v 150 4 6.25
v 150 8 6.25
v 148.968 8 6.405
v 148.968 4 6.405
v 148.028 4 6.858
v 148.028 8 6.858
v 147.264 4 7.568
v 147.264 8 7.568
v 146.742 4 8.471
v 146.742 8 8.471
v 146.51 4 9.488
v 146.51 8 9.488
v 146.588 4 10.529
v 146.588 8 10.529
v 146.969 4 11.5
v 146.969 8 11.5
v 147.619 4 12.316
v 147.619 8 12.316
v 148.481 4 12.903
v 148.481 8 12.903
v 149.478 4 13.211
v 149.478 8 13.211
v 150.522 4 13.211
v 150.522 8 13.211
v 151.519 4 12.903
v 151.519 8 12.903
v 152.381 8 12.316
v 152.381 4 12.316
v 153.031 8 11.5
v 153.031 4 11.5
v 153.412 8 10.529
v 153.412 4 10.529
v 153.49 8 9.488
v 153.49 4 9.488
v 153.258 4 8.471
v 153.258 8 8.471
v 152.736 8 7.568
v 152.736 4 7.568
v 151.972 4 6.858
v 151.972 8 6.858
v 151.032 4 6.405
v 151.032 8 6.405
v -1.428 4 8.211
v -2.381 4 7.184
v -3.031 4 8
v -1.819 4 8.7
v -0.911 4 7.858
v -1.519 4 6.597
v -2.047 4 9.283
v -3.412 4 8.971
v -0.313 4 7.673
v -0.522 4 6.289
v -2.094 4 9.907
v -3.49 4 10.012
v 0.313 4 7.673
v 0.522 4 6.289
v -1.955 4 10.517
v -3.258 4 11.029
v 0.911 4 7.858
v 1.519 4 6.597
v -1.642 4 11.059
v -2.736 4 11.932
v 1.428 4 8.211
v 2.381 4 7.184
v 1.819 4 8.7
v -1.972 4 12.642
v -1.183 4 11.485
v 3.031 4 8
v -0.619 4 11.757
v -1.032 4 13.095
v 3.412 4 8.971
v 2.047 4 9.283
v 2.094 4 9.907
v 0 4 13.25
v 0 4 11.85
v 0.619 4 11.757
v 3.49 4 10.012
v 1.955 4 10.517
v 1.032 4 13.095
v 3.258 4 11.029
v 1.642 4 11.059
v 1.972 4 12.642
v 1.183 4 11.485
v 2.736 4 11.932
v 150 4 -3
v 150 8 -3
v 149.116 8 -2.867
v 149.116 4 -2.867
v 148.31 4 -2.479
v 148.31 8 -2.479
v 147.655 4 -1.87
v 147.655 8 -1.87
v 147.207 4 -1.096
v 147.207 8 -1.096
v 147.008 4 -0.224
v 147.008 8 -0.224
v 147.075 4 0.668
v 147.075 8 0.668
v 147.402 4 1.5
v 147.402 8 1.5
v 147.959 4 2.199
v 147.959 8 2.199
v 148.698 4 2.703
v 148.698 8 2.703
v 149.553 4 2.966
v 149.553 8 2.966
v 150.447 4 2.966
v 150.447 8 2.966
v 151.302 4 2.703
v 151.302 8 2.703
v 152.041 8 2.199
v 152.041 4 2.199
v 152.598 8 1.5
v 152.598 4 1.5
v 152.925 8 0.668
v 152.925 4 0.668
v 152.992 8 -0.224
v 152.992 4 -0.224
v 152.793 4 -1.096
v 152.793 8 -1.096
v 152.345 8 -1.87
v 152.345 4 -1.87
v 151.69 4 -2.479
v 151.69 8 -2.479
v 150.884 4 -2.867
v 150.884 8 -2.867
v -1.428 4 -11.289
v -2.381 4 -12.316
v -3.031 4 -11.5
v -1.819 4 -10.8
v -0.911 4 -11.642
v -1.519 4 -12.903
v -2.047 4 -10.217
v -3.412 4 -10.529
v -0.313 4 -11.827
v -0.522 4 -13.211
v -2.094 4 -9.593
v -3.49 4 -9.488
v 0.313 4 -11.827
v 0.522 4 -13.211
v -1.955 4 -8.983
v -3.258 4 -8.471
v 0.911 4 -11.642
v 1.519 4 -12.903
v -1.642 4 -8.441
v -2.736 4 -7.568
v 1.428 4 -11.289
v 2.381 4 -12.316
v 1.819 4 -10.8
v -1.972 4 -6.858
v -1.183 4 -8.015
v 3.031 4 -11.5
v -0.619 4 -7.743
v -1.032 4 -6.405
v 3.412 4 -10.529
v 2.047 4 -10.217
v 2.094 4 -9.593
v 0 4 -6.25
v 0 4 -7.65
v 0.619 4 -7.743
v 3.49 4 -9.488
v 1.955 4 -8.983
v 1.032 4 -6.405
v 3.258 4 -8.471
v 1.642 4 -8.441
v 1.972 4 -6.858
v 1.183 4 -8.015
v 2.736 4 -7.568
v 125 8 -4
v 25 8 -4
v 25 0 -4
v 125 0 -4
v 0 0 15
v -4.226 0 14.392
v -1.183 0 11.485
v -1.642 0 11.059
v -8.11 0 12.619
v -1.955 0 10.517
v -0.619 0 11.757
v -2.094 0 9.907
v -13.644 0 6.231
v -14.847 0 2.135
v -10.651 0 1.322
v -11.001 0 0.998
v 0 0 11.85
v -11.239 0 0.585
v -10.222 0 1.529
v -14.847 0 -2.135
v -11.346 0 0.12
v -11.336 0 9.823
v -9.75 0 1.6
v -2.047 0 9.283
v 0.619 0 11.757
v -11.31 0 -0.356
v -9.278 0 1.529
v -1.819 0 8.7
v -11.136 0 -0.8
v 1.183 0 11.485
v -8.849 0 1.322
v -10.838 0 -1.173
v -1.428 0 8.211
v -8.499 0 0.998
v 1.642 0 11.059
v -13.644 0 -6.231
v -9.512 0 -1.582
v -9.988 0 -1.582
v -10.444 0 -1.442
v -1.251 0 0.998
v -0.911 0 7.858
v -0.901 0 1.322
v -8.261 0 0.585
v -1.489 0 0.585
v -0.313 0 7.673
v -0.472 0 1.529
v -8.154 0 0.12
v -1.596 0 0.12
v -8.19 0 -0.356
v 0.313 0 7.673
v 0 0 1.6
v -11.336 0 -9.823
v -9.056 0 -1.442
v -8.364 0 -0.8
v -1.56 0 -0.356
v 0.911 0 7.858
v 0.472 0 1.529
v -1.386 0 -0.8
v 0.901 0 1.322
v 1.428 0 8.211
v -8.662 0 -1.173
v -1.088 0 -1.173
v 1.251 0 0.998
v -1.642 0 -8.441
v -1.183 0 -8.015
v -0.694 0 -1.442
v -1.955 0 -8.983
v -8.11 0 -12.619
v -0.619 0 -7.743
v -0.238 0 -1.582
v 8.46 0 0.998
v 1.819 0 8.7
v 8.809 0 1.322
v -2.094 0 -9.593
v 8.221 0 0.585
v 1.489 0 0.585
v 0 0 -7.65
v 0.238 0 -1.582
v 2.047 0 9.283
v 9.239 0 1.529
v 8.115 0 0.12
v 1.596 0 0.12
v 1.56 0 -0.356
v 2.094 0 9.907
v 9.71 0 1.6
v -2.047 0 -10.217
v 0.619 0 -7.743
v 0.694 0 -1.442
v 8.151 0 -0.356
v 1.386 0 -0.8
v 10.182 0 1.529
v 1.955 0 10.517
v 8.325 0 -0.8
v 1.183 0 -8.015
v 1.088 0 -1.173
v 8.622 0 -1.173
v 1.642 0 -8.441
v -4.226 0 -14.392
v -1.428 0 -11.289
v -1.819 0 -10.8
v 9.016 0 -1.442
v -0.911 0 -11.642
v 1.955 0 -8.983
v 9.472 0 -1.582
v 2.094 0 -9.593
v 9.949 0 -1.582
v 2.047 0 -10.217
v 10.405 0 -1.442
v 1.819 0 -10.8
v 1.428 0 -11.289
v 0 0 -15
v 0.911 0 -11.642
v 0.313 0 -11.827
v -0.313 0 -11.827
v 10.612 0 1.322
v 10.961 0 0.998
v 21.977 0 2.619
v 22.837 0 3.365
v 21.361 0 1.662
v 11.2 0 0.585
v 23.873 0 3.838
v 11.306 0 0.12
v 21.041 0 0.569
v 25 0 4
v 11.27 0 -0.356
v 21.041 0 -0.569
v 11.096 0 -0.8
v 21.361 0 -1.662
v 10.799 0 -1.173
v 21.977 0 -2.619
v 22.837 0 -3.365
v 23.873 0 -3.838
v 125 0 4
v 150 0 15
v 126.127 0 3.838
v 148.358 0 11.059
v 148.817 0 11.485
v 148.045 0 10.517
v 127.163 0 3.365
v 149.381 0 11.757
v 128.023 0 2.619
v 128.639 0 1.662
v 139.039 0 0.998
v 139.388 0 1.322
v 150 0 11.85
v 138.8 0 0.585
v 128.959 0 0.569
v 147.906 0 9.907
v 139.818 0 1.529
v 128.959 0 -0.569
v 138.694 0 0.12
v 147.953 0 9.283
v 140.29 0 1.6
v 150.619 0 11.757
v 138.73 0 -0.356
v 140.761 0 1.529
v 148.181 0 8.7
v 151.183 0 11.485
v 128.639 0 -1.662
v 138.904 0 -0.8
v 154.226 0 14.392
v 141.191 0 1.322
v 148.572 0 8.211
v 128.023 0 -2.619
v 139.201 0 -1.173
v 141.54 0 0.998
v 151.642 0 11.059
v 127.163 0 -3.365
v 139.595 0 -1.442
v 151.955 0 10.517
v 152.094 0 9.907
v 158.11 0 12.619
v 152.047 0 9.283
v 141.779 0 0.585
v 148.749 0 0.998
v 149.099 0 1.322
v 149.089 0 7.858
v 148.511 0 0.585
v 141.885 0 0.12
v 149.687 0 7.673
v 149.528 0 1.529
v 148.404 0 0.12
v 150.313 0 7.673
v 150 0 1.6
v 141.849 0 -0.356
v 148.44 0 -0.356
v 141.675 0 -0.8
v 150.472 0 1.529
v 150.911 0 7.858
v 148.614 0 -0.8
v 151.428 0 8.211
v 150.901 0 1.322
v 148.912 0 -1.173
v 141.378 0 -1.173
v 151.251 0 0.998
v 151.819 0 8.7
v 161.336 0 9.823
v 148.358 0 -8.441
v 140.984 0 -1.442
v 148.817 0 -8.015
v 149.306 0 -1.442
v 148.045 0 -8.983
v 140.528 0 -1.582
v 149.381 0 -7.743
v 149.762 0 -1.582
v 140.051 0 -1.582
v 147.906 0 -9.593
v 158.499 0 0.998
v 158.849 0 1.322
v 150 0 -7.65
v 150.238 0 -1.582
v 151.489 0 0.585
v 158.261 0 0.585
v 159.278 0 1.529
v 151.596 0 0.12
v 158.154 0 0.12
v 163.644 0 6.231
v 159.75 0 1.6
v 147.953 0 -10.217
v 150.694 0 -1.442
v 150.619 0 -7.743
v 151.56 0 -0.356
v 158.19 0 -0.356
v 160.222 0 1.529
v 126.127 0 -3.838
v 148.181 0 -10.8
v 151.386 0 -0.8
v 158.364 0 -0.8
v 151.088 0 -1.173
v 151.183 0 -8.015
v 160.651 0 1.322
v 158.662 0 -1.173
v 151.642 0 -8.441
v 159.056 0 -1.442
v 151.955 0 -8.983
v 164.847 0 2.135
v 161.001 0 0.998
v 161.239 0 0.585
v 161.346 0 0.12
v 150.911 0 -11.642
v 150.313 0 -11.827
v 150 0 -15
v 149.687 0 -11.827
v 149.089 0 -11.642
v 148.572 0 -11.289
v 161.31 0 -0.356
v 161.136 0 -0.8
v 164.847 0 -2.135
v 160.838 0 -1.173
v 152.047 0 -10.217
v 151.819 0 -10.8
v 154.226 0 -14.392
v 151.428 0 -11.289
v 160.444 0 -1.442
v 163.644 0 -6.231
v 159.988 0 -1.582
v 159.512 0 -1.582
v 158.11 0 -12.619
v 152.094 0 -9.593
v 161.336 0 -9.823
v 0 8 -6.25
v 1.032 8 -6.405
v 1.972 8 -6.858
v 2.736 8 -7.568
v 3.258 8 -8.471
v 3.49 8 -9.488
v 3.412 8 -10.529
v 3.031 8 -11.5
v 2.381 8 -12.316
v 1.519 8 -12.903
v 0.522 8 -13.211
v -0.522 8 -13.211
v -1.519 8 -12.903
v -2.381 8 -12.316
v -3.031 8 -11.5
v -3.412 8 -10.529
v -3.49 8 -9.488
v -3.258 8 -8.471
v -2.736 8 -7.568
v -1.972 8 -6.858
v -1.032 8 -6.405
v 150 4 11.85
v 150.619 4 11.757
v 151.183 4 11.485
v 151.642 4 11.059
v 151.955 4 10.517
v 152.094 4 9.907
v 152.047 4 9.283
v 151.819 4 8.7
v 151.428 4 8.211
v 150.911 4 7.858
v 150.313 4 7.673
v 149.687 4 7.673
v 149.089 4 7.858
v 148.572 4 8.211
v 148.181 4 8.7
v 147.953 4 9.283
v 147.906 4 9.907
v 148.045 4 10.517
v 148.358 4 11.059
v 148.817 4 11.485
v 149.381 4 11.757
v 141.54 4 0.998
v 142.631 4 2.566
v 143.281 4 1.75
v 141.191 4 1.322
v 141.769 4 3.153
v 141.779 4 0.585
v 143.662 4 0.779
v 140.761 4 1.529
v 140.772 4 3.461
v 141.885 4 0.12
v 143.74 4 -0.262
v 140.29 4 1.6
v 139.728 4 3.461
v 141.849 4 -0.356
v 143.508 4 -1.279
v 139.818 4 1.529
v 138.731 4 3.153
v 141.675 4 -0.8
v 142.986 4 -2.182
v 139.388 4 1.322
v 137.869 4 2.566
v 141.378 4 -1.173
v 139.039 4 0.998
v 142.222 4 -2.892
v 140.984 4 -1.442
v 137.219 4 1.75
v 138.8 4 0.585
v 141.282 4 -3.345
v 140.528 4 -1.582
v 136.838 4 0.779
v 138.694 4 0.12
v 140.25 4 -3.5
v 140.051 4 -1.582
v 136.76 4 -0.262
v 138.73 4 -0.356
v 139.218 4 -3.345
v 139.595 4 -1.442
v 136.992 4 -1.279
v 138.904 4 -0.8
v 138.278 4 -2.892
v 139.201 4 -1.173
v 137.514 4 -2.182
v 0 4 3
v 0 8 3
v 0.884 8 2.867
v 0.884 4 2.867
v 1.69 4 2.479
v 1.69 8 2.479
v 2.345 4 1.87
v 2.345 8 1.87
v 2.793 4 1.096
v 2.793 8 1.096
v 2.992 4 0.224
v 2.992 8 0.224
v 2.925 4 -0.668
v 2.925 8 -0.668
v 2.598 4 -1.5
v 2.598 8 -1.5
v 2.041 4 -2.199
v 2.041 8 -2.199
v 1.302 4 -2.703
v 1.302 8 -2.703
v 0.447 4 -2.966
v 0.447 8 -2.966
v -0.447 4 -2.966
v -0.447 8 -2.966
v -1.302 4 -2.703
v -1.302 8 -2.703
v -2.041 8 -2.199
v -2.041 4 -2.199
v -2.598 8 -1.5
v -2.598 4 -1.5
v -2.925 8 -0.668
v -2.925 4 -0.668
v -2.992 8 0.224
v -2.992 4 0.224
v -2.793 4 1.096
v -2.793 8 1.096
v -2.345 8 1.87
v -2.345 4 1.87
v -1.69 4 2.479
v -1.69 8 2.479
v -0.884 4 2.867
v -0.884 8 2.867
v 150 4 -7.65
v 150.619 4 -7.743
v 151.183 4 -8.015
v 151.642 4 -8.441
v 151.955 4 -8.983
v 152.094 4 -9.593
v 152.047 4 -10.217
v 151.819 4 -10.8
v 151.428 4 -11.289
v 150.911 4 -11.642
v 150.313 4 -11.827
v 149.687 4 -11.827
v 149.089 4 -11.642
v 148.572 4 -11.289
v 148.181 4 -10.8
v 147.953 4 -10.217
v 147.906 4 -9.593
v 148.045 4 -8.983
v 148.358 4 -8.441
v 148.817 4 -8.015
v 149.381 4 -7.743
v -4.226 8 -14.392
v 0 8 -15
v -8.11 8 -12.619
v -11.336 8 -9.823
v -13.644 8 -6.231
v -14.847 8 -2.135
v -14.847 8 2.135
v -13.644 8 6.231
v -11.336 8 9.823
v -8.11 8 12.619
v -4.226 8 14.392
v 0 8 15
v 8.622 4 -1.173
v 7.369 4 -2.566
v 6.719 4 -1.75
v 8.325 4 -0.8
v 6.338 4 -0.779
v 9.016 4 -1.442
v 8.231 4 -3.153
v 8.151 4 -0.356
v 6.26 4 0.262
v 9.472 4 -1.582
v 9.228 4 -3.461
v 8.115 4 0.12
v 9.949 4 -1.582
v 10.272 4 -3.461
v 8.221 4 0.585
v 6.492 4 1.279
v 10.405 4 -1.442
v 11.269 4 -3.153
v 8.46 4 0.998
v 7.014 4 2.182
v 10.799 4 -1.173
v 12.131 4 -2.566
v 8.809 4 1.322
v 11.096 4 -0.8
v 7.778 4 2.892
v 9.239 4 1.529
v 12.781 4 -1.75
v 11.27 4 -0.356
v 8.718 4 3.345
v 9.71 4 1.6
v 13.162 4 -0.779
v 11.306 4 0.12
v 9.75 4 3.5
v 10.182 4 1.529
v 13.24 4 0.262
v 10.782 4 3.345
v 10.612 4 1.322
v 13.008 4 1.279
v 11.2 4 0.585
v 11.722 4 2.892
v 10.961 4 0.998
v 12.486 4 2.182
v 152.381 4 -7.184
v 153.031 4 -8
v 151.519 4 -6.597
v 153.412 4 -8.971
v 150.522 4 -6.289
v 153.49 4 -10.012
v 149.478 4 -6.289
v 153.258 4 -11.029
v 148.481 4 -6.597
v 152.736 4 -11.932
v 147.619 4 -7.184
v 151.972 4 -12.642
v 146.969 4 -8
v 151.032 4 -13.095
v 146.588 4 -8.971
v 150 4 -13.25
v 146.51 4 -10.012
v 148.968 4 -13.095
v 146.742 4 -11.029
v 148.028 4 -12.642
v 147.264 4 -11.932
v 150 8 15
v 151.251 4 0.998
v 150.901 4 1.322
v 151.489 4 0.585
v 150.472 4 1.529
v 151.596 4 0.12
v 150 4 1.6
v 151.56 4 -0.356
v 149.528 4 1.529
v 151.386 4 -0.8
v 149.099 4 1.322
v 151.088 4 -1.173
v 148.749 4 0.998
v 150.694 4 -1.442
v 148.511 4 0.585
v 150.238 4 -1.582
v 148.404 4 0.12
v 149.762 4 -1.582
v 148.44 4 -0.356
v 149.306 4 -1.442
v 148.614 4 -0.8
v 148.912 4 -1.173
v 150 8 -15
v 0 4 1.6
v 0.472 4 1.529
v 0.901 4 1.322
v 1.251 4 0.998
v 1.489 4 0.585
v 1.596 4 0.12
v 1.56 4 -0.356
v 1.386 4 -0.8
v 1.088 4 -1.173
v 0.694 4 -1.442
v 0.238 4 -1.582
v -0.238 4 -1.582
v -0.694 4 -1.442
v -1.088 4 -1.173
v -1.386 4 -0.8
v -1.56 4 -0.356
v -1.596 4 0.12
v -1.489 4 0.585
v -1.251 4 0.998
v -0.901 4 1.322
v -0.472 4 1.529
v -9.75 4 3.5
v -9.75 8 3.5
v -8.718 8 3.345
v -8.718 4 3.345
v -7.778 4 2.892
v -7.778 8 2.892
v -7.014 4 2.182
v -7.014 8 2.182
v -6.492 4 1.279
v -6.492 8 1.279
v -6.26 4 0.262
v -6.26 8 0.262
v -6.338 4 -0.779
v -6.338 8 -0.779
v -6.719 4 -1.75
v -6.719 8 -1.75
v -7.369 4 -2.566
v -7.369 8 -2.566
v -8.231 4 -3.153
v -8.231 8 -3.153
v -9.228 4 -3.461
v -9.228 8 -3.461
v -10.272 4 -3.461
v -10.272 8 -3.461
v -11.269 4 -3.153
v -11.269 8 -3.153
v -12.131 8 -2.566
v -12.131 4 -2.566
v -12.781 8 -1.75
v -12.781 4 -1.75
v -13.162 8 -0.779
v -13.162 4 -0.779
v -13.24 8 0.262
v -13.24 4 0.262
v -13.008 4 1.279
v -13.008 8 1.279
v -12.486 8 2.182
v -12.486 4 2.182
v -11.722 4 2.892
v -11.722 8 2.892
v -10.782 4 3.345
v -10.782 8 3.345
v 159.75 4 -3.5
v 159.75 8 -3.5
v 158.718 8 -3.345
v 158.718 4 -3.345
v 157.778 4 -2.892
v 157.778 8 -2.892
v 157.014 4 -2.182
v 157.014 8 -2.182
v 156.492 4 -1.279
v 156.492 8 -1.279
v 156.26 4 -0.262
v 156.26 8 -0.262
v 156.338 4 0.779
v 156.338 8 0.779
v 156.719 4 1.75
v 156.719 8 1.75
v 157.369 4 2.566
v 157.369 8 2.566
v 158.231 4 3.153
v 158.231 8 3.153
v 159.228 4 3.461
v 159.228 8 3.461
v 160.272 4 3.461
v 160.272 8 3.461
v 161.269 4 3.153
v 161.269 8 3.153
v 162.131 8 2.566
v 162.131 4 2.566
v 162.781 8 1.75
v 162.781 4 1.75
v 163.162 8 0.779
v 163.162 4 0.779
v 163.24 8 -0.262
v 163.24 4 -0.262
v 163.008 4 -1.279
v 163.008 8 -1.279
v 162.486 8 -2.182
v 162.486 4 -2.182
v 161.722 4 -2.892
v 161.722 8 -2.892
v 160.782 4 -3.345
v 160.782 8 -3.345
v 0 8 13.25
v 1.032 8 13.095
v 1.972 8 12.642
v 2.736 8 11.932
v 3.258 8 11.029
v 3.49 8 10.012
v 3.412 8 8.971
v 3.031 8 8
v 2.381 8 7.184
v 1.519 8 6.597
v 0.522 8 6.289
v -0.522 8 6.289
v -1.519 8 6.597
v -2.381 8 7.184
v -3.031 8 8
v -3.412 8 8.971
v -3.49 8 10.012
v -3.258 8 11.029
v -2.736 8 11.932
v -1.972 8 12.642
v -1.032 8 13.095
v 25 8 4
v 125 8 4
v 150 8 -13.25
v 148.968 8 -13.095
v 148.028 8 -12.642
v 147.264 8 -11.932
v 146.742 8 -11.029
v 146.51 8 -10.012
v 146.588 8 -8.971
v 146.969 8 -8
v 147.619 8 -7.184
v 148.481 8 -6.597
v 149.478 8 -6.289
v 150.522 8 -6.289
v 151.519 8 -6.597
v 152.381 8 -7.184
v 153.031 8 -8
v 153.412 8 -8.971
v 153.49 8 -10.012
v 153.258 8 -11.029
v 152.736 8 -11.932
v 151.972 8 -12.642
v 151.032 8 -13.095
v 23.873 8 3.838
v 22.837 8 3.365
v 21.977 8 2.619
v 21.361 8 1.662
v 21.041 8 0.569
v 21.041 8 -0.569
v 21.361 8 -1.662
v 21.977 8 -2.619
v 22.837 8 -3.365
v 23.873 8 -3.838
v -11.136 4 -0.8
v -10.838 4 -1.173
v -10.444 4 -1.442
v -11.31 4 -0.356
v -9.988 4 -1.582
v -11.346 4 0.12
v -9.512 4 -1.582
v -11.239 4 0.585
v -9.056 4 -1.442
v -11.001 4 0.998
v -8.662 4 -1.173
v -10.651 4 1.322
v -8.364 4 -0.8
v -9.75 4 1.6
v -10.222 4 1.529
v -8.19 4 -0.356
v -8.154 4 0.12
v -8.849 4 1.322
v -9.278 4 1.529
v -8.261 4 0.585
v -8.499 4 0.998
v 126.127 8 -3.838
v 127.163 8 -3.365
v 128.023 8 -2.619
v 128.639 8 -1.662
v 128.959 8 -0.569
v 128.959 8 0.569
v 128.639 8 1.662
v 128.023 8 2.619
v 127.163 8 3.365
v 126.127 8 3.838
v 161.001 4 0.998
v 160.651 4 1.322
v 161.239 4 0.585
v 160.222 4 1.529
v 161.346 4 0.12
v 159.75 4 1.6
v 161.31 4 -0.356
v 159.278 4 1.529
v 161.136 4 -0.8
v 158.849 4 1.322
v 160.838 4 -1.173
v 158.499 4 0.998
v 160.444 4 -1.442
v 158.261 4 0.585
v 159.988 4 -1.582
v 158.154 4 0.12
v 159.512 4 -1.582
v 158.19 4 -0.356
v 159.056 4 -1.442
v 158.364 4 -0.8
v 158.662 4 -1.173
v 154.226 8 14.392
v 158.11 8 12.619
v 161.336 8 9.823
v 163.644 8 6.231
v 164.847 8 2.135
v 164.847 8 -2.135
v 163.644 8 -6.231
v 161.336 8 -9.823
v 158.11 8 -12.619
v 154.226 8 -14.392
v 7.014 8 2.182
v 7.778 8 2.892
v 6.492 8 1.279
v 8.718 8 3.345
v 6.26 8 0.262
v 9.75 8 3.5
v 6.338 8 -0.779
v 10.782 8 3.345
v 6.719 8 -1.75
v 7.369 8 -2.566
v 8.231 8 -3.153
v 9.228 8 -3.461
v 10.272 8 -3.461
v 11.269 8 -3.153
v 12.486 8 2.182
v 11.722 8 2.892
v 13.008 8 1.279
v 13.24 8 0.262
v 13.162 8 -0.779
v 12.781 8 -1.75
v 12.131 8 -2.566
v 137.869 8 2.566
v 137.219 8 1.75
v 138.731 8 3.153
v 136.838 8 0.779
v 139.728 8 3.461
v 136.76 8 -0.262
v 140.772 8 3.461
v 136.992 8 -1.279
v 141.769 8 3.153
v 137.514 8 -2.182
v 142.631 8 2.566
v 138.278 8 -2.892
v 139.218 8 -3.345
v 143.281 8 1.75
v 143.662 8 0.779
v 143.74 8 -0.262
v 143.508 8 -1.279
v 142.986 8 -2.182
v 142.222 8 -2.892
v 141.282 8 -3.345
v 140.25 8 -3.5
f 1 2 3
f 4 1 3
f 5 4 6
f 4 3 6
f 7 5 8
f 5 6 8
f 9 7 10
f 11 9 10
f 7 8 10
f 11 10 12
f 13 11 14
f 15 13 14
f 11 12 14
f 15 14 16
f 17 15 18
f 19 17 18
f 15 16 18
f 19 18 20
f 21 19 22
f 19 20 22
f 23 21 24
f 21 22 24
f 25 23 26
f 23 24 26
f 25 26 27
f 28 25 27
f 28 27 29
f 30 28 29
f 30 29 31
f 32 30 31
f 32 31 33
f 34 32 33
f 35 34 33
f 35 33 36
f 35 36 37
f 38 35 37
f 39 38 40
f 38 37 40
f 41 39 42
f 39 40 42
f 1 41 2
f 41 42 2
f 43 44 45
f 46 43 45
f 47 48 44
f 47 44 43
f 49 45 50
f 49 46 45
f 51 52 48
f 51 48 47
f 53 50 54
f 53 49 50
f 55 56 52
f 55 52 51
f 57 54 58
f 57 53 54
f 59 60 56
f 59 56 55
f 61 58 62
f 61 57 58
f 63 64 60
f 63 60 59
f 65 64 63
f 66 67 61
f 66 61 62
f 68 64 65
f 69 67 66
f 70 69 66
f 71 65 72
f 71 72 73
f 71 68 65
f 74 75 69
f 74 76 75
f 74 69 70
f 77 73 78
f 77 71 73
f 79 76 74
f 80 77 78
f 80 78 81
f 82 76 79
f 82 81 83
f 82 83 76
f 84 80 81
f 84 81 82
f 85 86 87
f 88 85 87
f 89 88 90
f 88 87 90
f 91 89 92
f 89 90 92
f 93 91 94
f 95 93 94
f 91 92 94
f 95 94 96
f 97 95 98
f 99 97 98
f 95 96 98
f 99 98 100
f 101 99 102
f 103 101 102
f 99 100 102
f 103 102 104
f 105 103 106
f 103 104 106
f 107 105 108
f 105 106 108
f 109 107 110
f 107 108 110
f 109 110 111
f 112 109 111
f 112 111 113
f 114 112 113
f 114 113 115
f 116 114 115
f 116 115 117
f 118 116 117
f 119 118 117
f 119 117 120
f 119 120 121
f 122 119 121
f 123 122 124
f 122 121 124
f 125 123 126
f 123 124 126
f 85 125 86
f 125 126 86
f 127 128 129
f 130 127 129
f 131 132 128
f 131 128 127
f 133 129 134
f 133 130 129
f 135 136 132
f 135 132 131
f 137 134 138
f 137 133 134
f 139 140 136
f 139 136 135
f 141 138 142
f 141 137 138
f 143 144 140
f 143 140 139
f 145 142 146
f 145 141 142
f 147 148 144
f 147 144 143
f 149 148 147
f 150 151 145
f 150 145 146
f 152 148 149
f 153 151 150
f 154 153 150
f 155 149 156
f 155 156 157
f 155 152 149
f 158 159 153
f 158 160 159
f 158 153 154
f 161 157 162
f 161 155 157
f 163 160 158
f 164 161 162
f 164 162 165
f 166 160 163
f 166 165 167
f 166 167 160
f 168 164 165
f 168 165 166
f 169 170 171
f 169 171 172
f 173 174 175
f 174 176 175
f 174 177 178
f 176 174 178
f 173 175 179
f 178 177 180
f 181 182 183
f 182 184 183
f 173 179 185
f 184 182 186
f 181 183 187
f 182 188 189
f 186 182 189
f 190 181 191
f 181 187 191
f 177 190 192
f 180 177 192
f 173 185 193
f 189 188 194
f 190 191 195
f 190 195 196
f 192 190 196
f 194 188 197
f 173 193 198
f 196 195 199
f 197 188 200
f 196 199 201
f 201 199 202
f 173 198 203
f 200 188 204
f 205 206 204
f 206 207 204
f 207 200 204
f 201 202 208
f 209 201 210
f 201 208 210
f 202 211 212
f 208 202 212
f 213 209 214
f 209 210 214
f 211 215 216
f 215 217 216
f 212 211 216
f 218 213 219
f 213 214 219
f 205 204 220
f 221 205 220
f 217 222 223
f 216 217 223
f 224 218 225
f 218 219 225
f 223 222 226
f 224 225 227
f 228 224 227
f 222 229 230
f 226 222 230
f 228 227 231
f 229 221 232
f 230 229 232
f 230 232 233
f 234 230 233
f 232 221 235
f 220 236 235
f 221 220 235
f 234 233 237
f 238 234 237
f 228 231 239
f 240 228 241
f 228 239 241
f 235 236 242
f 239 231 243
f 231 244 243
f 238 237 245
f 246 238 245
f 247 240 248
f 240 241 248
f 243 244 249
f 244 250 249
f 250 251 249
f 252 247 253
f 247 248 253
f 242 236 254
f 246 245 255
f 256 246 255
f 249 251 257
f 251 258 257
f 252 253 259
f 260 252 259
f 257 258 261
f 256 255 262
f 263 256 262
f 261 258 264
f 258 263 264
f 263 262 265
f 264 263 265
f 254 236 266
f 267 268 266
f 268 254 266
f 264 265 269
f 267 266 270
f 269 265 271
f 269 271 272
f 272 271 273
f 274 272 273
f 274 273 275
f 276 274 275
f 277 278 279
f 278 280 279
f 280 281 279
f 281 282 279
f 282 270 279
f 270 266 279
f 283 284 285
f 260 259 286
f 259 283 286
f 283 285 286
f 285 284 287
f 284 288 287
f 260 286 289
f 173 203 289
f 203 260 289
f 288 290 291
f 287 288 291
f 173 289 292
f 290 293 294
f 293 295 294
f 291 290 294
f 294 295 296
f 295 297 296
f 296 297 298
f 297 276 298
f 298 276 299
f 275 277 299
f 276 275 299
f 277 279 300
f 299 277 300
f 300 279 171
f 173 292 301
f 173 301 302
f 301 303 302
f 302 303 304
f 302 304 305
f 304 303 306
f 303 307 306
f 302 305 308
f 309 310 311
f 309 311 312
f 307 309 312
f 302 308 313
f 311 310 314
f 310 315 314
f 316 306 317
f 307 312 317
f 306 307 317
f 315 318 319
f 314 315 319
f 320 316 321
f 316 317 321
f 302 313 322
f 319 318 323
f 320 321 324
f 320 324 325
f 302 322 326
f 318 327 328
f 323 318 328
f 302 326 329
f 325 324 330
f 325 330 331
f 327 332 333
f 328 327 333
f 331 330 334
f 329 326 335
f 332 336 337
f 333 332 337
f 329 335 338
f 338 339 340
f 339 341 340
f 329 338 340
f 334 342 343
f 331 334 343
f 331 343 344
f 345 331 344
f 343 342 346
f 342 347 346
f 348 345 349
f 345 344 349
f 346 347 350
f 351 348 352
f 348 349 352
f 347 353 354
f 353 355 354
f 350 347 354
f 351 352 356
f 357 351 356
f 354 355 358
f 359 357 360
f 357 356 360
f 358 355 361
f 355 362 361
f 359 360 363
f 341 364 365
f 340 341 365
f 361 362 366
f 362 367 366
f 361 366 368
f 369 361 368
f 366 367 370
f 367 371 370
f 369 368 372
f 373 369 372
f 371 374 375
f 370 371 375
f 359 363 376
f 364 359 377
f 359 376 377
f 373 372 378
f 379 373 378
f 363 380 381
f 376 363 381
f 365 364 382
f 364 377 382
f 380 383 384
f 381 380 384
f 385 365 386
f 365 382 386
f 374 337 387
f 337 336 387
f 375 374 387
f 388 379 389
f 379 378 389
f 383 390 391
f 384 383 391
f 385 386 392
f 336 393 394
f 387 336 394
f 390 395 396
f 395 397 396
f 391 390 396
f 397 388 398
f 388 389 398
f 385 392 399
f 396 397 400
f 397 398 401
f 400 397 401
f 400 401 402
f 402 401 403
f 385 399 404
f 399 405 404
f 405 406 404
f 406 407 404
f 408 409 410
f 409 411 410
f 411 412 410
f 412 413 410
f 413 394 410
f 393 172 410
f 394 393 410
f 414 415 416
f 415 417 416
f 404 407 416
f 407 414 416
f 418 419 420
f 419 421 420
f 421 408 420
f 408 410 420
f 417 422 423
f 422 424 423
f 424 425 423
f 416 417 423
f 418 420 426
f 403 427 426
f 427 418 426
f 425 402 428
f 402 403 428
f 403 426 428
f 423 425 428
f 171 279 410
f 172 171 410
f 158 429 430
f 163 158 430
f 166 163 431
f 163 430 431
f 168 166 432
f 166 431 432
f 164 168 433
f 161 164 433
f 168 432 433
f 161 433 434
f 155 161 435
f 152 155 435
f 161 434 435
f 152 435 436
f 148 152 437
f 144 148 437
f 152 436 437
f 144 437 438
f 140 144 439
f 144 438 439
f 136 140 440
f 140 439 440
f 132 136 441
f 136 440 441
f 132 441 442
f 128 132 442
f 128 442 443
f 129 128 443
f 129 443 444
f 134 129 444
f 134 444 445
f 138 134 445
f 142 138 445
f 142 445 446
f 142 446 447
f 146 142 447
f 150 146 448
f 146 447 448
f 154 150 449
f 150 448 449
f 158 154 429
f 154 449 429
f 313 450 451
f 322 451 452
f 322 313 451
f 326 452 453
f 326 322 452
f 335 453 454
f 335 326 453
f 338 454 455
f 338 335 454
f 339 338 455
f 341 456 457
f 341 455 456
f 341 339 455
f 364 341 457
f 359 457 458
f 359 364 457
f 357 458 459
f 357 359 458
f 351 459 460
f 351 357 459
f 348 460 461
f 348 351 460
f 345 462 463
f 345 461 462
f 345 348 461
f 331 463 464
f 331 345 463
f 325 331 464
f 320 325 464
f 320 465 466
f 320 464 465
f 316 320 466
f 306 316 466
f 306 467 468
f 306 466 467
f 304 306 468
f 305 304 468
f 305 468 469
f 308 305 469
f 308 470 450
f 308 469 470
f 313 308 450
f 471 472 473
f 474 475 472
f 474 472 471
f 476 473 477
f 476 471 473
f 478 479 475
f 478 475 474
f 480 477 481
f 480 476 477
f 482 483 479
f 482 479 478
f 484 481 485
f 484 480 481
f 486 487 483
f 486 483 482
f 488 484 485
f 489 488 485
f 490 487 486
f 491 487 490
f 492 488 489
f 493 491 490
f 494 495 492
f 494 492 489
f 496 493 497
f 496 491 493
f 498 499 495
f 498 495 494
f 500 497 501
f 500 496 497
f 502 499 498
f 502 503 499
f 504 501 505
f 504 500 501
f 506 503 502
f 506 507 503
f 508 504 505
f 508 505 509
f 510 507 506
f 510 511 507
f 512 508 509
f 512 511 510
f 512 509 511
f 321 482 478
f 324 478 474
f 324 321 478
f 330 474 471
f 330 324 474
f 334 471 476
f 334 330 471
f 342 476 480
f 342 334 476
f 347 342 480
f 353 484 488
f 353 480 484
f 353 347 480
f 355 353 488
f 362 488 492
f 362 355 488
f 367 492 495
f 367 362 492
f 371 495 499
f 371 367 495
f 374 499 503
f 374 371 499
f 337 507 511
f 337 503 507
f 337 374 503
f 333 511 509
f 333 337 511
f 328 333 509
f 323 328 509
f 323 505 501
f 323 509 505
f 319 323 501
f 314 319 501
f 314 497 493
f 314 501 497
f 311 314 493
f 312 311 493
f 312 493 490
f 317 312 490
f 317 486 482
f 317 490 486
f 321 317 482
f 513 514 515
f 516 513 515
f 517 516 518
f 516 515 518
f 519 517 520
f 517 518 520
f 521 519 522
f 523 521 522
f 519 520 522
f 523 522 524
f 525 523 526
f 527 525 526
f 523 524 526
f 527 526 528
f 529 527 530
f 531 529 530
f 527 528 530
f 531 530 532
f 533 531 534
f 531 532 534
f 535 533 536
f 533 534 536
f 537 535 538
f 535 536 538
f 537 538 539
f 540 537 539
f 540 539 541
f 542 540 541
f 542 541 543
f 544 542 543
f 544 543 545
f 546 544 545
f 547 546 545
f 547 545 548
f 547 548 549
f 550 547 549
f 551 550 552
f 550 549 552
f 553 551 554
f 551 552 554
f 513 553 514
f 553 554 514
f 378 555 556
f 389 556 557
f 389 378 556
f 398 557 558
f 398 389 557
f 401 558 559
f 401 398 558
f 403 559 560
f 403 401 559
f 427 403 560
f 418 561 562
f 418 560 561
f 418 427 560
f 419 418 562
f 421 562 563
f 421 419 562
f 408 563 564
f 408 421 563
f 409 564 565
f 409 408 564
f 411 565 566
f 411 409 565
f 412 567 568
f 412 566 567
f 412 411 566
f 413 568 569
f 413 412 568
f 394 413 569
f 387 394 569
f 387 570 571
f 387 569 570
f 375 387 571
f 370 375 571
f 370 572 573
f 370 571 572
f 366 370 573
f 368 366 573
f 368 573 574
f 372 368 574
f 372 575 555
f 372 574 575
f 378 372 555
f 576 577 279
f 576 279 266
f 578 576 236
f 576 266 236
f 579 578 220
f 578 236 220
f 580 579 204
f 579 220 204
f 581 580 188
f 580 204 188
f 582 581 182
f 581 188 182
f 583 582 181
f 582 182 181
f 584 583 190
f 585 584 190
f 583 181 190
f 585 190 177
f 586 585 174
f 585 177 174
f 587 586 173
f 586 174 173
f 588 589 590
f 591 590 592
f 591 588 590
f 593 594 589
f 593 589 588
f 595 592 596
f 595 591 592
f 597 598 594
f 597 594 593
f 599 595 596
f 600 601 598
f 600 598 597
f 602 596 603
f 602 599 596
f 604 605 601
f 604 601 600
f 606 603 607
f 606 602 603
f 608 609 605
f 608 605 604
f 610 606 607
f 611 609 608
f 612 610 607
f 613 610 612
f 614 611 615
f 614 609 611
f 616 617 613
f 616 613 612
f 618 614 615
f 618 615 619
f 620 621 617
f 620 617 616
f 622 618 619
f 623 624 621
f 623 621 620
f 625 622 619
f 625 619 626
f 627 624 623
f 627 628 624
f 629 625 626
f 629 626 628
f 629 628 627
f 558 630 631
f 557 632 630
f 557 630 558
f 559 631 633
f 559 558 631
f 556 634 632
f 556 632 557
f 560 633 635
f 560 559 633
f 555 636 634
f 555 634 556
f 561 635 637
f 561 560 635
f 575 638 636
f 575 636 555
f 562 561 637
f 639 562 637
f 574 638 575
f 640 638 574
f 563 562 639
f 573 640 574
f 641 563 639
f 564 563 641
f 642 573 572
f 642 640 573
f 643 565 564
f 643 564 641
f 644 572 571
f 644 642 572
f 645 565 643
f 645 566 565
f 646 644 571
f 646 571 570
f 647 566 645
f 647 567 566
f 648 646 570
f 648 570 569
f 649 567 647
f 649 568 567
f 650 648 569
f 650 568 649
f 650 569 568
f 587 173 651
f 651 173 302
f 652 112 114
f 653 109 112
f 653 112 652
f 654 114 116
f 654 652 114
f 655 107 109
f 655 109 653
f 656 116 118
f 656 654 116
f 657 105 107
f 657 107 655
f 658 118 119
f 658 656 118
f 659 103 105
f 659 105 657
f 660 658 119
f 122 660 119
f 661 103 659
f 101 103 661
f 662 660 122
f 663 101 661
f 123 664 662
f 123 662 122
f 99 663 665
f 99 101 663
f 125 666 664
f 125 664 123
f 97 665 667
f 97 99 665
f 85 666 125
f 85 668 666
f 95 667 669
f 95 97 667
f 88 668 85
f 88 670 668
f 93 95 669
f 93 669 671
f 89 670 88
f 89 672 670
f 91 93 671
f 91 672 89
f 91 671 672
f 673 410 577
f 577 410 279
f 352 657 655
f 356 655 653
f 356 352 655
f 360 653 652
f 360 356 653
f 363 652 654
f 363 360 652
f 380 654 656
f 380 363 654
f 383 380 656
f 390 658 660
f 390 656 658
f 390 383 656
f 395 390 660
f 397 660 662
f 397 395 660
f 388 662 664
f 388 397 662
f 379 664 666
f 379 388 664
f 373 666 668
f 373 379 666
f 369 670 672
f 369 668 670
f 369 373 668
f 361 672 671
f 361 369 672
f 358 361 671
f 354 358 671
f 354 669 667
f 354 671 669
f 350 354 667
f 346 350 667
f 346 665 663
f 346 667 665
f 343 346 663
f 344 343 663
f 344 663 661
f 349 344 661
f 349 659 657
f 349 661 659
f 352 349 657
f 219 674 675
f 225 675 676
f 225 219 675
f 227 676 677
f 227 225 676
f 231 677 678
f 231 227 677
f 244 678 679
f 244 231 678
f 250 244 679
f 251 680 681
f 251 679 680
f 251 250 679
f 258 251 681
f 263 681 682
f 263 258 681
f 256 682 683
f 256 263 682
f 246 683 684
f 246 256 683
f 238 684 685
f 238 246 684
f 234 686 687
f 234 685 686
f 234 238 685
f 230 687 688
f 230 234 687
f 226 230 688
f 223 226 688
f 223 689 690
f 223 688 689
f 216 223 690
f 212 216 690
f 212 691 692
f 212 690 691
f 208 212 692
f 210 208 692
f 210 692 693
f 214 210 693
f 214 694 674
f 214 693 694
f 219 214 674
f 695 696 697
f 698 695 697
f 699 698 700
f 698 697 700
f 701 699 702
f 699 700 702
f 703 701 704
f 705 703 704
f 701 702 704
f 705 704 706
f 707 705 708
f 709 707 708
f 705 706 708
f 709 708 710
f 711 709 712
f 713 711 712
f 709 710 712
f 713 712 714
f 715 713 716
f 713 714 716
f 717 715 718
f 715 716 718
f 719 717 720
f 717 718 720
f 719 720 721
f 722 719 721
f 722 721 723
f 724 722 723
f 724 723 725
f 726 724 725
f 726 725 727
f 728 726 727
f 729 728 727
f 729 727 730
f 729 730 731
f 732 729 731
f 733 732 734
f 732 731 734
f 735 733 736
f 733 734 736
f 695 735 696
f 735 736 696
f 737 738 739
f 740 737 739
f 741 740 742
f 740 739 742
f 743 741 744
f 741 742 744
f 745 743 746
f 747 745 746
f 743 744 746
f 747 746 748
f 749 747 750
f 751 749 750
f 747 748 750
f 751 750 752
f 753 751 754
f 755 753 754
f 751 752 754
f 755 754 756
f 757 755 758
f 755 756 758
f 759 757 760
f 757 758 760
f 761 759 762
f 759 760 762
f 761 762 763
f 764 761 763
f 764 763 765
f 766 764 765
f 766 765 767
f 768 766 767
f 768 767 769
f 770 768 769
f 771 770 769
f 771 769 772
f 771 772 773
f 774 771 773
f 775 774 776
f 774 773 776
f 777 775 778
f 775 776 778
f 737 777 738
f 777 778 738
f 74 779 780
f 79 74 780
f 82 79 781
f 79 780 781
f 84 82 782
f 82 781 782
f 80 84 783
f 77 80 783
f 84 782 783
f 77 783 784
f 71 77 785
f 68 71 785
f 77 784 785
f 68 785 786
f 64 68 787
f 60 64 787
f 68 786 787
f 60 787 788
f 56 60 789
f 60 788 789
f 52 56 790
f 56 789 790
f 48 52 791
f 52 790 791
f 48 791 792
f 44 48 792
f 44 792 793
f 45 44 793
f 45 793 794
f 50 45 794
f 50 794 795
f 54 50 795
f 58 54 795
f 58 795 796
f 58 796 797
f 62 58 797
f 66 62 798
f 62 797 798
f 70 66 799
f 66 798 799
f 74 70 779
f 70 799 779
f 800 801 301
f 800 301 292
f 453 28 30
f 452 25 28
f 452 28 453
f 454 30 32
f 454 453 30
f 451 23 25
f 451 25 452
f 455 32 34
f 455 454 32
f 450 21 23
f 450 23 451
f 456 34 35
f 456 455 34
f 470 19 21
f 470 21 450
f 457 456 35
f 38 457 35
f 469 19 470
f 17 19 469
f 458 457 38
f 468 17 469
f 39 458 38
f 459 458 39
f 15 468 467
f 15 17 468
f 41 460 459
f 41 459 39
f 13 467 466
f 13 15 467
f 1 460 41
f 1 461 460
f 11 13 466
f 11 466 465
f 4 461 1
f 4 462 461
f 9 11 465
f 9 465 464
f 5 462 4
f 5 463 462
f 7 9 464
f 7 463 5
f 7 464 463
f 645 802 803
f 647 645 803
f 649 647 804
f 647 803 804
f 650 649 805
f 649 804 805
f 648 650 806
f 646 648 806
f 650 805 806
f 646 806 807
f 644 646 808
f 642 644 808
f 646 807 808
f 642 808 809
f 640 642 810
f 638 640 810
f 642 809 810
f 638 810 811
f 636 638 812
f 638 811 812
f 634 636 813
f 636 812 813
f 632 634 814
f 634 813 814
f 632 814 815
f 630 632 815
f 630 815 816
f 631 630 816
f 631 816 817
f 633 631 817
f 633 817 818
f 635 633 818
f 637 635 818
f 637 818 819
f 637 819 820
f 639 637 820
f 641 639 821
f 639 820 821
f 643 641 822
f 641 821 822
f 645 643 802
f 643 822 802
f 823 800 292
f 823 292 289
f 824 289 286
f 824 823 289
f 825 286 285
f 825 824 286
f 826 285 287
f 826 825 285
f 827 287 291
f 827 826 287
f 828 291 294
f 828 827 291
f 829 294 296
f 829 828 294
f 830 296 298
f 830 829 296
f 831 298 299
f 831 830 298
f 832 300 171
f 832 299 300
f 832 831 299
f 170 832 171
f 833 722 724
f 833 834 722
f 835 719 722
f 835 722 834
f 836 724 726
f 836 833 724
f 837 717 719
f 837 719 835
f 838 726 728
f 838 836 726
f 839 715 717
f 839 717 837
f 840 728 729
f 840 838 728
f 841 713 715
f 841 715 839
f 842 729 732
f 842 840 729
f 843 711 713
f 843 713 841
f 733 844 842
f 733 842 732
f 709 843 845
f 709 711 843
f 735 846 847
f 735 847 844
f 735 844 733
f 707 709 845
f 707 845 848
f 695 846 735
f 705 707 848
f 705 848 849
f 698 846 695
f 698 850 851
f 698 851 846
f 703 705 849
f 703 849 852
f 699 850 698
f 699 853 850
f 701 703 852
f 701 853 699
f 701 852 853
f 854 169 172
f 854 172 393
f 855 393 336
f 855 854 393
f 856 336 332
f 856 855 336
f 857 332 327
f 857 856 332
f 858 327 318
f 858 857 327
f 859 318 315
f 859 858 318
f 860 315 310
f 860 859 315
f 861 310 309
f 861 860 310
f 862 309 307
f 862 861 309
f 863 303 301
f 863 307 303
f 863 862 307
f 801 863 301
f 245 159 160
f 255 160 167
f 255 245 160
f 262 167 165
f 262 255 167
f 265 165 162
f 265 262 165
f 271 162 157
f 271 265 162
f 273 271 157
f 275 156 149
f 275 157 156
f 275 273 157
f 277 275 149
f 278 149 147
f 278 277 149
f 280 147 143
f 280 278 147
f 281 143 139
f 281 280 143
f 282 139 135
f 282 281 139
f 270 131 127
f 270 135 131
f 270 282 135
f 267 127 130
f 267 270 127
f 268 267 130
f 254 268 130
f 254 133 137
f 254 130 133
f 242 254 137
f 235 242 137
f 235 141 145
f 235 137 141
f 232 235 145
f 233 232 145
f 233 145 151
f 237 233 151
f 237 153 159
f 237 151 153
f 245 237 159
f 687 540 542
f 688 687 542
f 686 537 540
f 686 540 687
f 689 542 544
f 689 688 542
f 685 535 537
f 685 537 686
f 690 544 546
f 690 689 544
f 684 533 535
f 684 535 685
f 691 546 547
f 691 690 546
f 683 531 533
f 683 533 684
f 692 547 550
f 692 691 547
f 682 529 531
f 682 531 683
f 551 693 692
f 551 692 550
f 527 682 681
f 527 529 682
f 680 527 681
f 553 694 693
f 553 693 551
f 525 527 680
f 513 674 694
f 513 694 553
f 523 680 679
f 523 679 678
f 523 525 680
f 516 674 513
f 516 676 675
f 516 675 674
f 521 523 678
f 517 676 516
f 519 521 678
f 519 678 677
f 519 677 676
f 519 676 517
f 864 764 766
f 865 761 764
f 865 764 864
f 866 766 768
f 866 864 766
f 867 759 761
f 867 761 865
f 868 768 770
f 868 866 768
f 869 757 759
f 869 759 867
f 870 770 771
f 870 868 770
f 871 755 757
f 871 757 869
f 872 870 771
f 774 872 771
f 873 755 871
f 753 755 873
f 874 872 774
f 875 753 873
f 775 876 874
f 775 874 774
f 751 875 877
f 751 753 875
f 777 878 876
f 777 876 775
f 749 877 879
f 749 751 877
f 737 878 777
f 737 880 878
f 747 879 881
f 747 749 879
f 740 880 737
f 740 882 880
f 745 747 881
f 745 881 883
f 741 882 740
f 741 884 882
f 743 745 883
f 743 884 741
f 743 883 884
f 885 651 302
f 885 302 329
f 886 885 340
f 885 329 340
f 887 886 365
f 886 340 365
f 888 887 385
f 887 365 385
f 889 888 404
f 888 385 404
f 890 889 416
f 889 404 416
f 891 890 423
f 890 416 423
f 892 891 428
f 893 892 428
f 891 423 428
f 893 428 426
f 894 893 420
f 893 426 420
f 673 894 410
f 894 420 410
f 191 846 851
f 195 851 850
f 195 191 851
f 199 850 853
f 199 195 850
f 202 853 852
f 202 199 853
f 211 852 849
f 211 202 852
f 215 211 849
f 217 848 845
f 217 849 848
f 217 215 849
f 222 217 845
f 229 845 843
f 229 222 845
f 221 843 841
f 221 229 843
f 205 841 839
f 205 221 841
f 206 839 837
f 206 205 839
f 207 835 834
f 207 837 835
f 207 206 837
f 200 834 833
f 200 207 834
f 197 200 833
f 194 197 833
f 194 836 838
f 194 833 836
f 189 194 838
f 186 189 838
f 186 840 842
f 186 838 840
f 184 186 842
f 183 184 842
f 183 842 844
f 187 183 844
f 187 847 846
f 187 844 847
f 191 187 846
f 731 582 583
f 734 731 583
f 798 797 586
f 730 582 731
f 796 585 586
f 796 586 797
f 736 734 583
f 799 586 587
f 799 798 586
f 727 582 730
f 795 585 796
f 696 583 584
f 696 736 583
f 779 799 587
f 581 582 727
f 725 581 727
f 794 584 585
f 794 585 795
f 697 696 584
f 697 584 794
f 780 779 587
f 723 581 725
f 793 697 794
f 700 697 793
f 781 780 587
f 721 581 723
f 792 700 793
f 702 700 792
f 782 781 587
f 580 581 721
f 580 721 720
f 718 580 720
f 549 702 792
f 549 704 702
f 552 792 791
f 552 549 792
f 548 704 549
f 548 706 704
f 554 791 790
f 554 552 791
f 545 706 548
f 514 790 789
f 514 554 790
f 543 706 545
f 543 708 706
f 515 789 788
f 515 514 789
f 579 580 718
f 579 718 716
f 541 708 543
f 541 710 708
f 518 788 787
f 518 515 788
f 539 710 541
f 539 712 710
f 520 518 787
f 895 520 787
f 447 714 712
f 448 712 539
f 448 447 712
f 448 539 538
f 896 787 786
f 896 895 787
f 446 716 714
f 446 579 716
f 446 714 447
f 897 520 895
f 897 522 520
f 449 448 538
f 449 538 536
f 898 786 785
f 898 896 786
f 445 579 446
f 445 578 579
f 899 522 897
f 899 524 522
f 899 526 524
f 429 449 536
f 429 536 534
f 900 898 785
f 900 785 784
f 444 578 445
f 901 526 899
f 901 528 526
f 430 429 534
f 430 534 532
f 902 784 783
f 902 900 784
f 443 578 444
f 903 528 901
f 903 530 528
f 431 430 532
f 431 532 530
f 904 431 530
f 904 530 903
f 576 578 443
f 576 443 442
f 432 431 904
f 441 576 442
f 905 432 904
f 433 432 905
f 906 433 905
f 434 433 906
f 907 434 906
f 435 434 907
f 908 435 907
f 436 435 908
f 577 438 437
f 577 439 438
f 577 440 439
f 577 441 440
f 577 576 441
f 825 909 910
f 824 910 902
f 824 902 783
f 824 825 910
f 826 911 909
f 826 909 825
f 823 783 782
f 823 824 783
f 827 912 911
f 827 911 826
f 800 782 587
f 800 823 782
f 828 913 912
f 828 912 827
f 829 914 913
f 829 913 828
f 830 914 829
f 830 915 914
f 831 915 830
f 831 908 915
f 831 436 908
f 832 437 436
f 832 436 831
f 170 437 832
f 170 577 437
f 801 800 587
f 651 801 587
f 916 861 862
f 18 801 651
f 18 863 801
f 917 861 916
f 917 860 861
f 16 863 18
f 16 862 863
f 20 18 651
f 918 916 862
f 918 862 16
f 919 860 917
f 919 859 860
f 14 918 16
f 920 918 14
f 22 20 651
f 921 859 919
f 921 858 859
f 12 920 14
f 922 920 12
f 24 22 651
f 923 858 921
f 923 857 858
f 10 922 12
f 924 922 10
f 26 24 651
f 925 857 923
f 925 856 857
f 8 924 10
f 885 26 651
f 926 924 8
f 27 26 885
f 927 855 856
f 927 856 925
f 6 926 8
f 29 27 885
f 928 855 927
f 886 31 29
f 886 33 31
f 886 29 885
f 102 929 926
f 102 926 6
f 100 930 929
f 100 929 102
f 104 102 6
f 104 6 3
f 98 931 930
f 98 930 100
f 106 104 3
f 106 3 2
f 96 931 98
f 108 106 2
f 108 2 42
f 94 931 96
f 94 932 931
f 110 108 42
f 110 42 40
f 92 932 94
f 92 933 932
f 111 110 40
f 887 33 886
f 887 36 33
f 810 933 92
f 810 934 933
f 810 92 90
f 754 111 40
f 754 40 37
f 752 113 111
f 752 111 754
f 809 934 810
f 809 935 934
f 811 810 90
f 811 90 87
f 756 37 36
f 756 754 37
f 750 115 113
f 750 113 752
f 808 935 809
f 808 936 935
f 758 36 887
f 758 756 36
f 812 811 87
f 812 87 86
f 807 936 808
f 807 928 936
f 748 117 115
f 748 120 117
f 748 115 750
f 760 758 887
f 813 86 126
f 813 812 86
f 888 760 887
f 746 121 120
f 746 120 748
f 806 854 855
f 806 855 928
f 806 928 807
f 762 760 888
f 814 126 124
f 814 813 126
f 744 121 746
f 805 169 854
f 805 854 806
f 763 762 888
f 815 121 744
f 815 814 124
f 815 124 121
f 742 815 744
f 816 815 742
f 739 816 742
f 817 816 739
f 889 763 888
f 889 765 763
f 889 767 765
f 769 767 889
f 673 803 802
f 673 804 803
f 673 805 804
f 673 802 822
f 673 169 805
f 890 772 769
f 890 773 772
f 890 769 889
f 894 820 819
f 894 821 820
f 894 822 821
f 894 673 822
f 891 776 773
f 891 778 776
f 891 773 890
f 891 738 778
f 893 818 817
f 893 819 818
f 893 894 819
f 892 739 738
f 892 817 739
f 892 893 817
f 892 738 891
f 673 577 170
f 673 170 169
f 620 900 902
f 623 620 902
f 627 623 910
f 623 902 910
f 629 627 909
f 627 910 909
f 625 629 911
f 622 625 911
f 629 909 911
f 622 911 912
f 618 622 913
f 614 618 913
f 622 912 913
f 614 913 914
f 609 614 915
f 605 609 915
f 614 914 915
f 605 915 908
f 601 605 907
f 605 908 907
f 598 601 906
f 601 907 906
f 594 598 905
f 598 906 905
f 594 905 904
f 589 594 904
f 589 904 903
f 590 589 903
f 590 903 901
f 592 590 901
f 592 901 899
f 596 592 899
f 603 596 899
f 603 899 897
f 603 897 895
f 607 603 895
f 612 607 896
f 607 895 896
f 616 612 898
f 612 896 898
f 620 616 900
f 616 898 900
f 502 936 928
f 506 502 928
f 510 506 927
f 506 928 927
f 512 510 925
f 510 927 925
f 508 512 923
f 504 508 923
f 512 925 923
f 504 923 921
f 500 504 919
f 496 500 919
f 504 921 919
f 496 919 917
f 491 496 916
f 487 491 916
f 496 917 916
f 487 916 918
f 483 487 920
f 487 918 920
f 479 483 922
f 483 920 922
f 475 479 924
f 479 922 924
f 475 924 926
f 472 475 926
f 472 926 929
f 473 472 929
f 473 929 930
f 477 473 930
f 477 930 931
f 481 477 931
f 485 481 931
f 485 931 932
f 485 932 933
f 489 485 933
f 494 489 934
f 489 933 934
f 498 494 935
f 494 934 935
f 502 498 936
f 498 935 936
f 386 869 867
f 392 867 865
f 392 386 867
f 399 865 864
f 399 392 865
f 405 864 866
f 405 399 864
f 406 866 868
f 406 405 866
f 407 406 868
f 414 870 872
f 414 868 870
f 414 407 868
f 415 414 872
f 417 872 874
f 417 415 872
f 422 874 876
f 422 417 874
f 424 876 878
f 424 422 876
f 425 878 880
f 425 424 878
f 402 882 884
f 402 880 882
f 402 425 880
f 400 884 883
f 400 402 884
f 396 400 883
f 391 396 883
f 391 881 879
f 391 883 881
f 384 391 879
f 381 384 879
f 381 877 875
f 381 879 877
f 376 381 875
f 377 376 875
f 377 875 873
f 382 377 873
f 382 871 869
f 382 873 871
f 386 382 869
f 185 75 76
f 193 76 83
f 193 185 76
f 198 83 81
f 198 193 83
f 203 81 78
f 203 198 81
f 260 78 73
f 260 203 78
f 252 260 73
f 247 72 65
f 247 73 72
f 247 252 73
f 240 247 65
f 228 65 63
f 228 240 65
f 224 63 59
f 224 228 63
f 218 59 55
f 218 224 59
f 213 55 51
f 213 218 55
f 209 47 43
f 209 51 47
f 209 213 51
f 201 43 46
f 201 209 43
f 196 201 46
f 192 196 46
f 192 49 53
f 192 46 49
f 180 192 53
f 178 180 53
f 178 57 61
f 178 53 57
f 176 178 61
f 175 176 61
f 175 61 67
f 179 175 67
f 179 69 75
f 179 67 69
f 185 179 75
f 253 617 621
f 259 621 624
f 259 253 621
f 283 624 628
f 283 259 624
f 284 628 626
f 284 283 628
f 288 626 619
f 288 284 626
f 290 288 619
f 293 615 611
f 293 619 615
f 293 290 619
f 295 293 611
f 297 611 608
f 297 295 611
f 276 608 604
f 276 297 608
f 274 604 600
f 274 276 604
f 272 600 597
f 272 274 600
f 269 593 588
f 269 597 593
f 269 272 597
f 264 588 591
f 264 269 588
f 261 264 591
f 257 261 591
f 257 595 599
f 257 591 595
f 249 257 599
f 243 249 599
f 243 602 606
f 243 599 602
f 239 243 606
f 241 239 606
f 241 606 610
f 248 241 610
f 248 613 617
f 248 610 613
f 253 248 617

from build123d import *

# Parameters (mm, degrees)
SKETCH_1_R          = 2.1
SKETCH_1_R_2        = 1.6
EXTRUDE_2_DEPTH     = 8
SKETCH_3_R          = 3
SKETCH_3_R_2        = 3.5
CUT_EXTRUDE_2_DEPTH = 4
CUT_EXTRUDE_3_DEPTH = 14


with BuildPart() as part:
    # 草图1 → 凸台-拉伸2 (new body)
    with BuildSketch(Plane(origin=(0, 0, 0), x_dir=(1, 0, 0), z_dir=(0, 1, 0))):
        with BuildLine():
            Line((0, -15), (150, -15))
            ThreePointArc((150, -15), (165, 0), (150, 15))
            Line((150, 15), (0, 15))
            ThreePointArc((0, 15), (-15, 0), (0, -15))
        make_face()
        with Locations(Location((150, -9.75, 0), (0, 0, 270))):
            Circle(SKETCH_1_R, mode=Mode.SUBTRACT)
        with Locations(Location((150, 9.75, 0), (0, 0, 270))):
            Circle(SKETCH_1_R, mode=Mode.SUBTRACT)
        with Locations(Location((0, 9.75, 0), (0, 0, 270))):
            Circle(SKETCH_1_R, mode=Mode.SUBTRACT)
        with Locations(Location((0, -9.75, 0), (0, 0, 270))):
            Circle(SKETCH_1_R, mode=Mode.SUBTRACT)
        with Locations(Location((-9.75, 0, 0), (0, 0, 270))):
            Circle(SKETCH_1_R_2, mode=Mode.SUBTRACT)
        with Locations(Location((9.710485561, 0, 0), (0, 0, 270))):
            Circle(SKETCH_1_R_2, mode=Mode.SUBTRACT)
        with Locations(Location((150, 0, 0), (0, 0, 270))):
            Circle(SKETCH_1_R_2, mode=Mode.SUBTRACT)
        with Locations(Location((0, 0, 0), (0, 0, 270))):
            Circle(SKETCH_1_R_2, mode=Mode.SUBTRACT)
        with Locations(Location((159.75, 0, 0), (0, 0, 270))):
            Circle(SKETCH_1_R_2, mode=Mode.SUBTRACT)
        with Locations(Location((140.289514439, 0, 0), (0, 0, 270))):
            Circle(SKETCH_1_R_2, mode=Mode.SUBTRACT)
    extrude(amount=EXTRUDE_2_DEPTH)

    # 草图3 → 切除-拉伸2 (cut)
    with BuildSketch(Plane(origin=(0, 8, 0), x_dir=(1, 0, 0), z_dir=(0, 1, 0))):
        with Locations(Location((0, 0, 0), (0, 0, 270))):
            Circle(SKETCH_3_R)
        with Locations(Location((0, 9.75, 0), (0, 0, 270))):
            Circle(SKETCH_3_R_2)
        with Locations(Location((9.75, 0, 0), (0, 0, 270))):
            Circle(SKETCH_3_R_2)
        with Locations(Location((0, -9.75, 0), (0, 0, 270))):
            Circle(SKETCH_3_R_2)
        with Locations(Location((-9.75, 0, 0), (0, 0, 270))):
            Circle(SKETCH_3_R_2)
        with Locations(Location((159.75, 0, 0), (0, 0, 90))):
            Circle(SKETCH_3_R_2)
        with Locations(Location((150, -9.75, 0), (0, 0, 90))):
            Circle(SKETCH_3_R_2)
        with Locations(Location((140.25, 0, 0), (0, 0, 90))):
            Circle(SKETCH_3_R_2)
        with Locations(Location((150, 9.75, 0), (0, 0, 90))):
            Circle(SKETCH_3_R_2)
        with Locations(Location((150, 0, 0), (0, 0, 90))):
            Circle(SKETCH_3_R)
    extrude(amount=-CUT_EXTRUDE_2_DEPTH, mode=Mode.SUBTRACT)

    # 草图4 → 切除-拉伸3 (cut)
    with BuildSketch(Plane(origin=(0, 8, 0), x_dir=(1, 0, 0), z_dir=(0, 1, 0))):
        with BuildLine():
            Line((25, 4), (125, 4))
            ThreePointArc((125, 4), (129, 0), (125, -4))
            Line((125, -4), (25, -4))
            ThreePointArc((25, -4), (21, 0), (25, 4))
        make_face()
    extrude(amount=-CUT_EXTRUDE_3_DEPTH, mode=Mode.SUBTRACT)


solid = part.part
